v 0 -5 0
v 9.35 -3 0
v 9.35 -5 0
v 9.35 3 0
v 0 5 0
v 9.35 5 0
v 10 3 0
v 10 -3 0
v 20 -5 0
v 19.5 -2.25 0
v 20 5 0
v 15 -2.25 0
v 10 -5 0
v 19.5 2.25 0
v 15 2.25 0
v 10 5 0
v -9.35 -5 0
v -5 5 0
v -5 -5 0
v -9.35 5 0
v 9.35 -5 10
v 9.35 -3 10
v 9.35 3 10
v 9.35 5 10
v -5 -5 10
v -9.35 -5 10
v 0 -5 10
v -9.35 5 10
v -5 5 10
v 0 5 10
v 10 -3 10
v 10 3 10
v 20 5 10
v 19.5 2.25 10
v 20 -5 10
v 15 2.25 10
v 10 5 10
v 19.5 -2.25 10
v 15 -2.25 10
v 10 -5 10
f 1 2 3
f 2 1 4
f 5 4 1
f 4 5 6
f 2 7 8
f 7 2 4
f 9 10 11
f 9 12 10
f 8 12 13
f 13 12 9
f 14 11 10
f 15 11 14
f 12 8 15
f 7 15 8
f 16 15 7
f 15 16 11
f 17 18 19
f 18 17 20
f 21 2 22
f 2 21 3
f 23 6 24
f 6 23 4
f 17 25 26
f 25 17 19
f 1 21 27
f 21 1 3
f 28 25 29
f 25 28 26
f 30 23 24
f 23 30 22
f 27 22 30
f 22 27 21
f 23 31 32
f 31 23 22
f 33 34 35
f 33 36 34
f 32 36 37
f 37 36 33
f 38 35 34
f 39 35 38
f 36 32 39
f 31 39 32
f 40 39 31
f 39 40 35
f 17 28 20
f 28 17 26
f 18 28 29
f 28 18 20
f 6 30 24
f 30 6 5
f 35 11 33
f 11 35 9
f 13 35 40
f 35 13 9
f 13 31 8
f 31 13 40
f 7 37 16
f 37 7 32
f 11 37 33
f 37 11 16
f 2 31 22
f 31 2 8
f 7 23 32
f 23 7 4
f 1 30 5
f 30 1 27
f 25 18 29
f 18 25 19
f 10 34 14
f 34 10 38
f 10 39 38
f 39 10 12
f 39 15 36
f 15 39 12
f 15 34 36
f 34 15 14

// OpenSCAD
// Snap-on clip for lab stand rod and tubing.
// Printed flat: 10 mm tall extrusion of a 2-D profile in the XY plane.
// Orientation: Rests on XY plane at Z=0, builds upward. Centred on origin.

// Rod dimensions
rod_id = 12.7;      // Inner diameter of rod ring
rod_wall = 3;       // Wall thickness of rod ring
rod_od = rod_id + 2 * rod_wall; // Outer diameter of rod ring (18.7 mm)

// Tubing dimensions
tube_id = 6;        // Inner diameter of tubing ring
tube_wall = 2;      // Wall thickness of tubing ring
tube_od = tube_id + 2 * tube_wall; // Outer diameter of tubing ring (10 mm)

// Bridge dimensions
bridge_x_start = 8; // Start X of bridge
bridge_x_end = 12;  // End X of bridge
bridge_y = 6;       // Width of bridge in Y

// Extrusion height
height = 10;

// Cutout dimensions for rod ring (opening on -X side)
cutout_rod_y_min = -5;
cutout_rod_y_max = 5;
cutout_rod_width = 10; // Width of the gap (from x = -5 to x = 5)

// Cutout dimensions for tubing ring (opening on +X side)
cutout_tube_y_min = -2.25;
cutout_tube_y_max = 2.25;
cutout_tube_width = 4.5; // Width of the gap (from x = 15 to x = 19.5)

$fn = 64;

// Define the 2D profile as a polygon in the XY plane.
// We construct the union of the three solid shapes (Rod Ring, Tubing Ring, Bridge)
// and then subtract the cutouts.

// Helper to generate points for a rectangle defined by x-range [x1, x2] and y-range [y1, y2]
function rect_xy_points(x1, y1, x2, y2) = [
    [x1, y1],
    [x2, y1],
    [x2, y2],
    [x1, y2]
];

// Helper to generate points for a rectangle centered at (cx, cy) with width w and height h
function rect_points(cx, cy, w, h) = [
    [cx - w/2, cy - h/2],
    [cx + w/2, cy - h/2],
    [cx + w/2, cy + h/2],
    [cx - w/2, cy + h/2]
];

// Construct the main body polygon
// 1. Outer Rod Ring (Centered at 0,0, OD=18.7)
rod_ring_outer = rect_points(0, 0, rod_od, height);

// 2. Outer Tubing Ring (Centered at 15,0, OD=10)
tube_ring_outer = rect_points(15, 0, tube_od, height);

// 3. Bridge (Rectangle from x=8 to x=12, y=-3 to y=3)
bridge_poly = rect_xy_points(bridge_x_start, -bridge_y/2, bridge_x_end, bridge_y/2);

// Cutout 1: Rod Ring Opening (-X side)
// Defined as x < 0 and -5 < y < 5.
// We need to cut a rectangle from x = -5 to x = 0, y = -5 to y = 5.
cutout_rod = rect_xy_points(-cutout_rod_width/2, cutout_rod_y_min, 0, cutout_rod_y_max);

// Cutout 2: Tubing Ring Opening (+X side)
// Defined as x > 15 and -2.25 < y < 2.25.
// We need to cut a rectangle from x = 15 to x = 19.5, y = -2.25 to y = 2.25.
cutout_tube = rect_xy_points(15, cutout_tube_y_min, 15 + cutout_tube_width, cutout_tube_y_max);

// Create the 2D profile
// Union of Rod Ring, Tubing Ring, and Bridge
// Difference with Cutouts

difference() {
    union() {
        // Rod Ring
        linear_extrude(height = height) polygon(rod_ring_outer);
        
        // Tubing Ring
        linear_extrude(height = height) polygon(tube_ring_outer);
        
        // Bridge
        linear_extrude(height = height) polygon(bridge_poly);
    }
    
    // Subtract Cutouts
    // Extend cutouts slightly to ensure clean cuts (Rule 5)
    // Cutout Rod
    translate([0, 0, -0.01]) linear_extrude(height = height + 0.02) polygon(cutout_rod);
    
    // Cutout Tube
    translate([0, 0, -0.01]) linear_extrude(height = height + 0.02) polygon(cutout_tube);
}
